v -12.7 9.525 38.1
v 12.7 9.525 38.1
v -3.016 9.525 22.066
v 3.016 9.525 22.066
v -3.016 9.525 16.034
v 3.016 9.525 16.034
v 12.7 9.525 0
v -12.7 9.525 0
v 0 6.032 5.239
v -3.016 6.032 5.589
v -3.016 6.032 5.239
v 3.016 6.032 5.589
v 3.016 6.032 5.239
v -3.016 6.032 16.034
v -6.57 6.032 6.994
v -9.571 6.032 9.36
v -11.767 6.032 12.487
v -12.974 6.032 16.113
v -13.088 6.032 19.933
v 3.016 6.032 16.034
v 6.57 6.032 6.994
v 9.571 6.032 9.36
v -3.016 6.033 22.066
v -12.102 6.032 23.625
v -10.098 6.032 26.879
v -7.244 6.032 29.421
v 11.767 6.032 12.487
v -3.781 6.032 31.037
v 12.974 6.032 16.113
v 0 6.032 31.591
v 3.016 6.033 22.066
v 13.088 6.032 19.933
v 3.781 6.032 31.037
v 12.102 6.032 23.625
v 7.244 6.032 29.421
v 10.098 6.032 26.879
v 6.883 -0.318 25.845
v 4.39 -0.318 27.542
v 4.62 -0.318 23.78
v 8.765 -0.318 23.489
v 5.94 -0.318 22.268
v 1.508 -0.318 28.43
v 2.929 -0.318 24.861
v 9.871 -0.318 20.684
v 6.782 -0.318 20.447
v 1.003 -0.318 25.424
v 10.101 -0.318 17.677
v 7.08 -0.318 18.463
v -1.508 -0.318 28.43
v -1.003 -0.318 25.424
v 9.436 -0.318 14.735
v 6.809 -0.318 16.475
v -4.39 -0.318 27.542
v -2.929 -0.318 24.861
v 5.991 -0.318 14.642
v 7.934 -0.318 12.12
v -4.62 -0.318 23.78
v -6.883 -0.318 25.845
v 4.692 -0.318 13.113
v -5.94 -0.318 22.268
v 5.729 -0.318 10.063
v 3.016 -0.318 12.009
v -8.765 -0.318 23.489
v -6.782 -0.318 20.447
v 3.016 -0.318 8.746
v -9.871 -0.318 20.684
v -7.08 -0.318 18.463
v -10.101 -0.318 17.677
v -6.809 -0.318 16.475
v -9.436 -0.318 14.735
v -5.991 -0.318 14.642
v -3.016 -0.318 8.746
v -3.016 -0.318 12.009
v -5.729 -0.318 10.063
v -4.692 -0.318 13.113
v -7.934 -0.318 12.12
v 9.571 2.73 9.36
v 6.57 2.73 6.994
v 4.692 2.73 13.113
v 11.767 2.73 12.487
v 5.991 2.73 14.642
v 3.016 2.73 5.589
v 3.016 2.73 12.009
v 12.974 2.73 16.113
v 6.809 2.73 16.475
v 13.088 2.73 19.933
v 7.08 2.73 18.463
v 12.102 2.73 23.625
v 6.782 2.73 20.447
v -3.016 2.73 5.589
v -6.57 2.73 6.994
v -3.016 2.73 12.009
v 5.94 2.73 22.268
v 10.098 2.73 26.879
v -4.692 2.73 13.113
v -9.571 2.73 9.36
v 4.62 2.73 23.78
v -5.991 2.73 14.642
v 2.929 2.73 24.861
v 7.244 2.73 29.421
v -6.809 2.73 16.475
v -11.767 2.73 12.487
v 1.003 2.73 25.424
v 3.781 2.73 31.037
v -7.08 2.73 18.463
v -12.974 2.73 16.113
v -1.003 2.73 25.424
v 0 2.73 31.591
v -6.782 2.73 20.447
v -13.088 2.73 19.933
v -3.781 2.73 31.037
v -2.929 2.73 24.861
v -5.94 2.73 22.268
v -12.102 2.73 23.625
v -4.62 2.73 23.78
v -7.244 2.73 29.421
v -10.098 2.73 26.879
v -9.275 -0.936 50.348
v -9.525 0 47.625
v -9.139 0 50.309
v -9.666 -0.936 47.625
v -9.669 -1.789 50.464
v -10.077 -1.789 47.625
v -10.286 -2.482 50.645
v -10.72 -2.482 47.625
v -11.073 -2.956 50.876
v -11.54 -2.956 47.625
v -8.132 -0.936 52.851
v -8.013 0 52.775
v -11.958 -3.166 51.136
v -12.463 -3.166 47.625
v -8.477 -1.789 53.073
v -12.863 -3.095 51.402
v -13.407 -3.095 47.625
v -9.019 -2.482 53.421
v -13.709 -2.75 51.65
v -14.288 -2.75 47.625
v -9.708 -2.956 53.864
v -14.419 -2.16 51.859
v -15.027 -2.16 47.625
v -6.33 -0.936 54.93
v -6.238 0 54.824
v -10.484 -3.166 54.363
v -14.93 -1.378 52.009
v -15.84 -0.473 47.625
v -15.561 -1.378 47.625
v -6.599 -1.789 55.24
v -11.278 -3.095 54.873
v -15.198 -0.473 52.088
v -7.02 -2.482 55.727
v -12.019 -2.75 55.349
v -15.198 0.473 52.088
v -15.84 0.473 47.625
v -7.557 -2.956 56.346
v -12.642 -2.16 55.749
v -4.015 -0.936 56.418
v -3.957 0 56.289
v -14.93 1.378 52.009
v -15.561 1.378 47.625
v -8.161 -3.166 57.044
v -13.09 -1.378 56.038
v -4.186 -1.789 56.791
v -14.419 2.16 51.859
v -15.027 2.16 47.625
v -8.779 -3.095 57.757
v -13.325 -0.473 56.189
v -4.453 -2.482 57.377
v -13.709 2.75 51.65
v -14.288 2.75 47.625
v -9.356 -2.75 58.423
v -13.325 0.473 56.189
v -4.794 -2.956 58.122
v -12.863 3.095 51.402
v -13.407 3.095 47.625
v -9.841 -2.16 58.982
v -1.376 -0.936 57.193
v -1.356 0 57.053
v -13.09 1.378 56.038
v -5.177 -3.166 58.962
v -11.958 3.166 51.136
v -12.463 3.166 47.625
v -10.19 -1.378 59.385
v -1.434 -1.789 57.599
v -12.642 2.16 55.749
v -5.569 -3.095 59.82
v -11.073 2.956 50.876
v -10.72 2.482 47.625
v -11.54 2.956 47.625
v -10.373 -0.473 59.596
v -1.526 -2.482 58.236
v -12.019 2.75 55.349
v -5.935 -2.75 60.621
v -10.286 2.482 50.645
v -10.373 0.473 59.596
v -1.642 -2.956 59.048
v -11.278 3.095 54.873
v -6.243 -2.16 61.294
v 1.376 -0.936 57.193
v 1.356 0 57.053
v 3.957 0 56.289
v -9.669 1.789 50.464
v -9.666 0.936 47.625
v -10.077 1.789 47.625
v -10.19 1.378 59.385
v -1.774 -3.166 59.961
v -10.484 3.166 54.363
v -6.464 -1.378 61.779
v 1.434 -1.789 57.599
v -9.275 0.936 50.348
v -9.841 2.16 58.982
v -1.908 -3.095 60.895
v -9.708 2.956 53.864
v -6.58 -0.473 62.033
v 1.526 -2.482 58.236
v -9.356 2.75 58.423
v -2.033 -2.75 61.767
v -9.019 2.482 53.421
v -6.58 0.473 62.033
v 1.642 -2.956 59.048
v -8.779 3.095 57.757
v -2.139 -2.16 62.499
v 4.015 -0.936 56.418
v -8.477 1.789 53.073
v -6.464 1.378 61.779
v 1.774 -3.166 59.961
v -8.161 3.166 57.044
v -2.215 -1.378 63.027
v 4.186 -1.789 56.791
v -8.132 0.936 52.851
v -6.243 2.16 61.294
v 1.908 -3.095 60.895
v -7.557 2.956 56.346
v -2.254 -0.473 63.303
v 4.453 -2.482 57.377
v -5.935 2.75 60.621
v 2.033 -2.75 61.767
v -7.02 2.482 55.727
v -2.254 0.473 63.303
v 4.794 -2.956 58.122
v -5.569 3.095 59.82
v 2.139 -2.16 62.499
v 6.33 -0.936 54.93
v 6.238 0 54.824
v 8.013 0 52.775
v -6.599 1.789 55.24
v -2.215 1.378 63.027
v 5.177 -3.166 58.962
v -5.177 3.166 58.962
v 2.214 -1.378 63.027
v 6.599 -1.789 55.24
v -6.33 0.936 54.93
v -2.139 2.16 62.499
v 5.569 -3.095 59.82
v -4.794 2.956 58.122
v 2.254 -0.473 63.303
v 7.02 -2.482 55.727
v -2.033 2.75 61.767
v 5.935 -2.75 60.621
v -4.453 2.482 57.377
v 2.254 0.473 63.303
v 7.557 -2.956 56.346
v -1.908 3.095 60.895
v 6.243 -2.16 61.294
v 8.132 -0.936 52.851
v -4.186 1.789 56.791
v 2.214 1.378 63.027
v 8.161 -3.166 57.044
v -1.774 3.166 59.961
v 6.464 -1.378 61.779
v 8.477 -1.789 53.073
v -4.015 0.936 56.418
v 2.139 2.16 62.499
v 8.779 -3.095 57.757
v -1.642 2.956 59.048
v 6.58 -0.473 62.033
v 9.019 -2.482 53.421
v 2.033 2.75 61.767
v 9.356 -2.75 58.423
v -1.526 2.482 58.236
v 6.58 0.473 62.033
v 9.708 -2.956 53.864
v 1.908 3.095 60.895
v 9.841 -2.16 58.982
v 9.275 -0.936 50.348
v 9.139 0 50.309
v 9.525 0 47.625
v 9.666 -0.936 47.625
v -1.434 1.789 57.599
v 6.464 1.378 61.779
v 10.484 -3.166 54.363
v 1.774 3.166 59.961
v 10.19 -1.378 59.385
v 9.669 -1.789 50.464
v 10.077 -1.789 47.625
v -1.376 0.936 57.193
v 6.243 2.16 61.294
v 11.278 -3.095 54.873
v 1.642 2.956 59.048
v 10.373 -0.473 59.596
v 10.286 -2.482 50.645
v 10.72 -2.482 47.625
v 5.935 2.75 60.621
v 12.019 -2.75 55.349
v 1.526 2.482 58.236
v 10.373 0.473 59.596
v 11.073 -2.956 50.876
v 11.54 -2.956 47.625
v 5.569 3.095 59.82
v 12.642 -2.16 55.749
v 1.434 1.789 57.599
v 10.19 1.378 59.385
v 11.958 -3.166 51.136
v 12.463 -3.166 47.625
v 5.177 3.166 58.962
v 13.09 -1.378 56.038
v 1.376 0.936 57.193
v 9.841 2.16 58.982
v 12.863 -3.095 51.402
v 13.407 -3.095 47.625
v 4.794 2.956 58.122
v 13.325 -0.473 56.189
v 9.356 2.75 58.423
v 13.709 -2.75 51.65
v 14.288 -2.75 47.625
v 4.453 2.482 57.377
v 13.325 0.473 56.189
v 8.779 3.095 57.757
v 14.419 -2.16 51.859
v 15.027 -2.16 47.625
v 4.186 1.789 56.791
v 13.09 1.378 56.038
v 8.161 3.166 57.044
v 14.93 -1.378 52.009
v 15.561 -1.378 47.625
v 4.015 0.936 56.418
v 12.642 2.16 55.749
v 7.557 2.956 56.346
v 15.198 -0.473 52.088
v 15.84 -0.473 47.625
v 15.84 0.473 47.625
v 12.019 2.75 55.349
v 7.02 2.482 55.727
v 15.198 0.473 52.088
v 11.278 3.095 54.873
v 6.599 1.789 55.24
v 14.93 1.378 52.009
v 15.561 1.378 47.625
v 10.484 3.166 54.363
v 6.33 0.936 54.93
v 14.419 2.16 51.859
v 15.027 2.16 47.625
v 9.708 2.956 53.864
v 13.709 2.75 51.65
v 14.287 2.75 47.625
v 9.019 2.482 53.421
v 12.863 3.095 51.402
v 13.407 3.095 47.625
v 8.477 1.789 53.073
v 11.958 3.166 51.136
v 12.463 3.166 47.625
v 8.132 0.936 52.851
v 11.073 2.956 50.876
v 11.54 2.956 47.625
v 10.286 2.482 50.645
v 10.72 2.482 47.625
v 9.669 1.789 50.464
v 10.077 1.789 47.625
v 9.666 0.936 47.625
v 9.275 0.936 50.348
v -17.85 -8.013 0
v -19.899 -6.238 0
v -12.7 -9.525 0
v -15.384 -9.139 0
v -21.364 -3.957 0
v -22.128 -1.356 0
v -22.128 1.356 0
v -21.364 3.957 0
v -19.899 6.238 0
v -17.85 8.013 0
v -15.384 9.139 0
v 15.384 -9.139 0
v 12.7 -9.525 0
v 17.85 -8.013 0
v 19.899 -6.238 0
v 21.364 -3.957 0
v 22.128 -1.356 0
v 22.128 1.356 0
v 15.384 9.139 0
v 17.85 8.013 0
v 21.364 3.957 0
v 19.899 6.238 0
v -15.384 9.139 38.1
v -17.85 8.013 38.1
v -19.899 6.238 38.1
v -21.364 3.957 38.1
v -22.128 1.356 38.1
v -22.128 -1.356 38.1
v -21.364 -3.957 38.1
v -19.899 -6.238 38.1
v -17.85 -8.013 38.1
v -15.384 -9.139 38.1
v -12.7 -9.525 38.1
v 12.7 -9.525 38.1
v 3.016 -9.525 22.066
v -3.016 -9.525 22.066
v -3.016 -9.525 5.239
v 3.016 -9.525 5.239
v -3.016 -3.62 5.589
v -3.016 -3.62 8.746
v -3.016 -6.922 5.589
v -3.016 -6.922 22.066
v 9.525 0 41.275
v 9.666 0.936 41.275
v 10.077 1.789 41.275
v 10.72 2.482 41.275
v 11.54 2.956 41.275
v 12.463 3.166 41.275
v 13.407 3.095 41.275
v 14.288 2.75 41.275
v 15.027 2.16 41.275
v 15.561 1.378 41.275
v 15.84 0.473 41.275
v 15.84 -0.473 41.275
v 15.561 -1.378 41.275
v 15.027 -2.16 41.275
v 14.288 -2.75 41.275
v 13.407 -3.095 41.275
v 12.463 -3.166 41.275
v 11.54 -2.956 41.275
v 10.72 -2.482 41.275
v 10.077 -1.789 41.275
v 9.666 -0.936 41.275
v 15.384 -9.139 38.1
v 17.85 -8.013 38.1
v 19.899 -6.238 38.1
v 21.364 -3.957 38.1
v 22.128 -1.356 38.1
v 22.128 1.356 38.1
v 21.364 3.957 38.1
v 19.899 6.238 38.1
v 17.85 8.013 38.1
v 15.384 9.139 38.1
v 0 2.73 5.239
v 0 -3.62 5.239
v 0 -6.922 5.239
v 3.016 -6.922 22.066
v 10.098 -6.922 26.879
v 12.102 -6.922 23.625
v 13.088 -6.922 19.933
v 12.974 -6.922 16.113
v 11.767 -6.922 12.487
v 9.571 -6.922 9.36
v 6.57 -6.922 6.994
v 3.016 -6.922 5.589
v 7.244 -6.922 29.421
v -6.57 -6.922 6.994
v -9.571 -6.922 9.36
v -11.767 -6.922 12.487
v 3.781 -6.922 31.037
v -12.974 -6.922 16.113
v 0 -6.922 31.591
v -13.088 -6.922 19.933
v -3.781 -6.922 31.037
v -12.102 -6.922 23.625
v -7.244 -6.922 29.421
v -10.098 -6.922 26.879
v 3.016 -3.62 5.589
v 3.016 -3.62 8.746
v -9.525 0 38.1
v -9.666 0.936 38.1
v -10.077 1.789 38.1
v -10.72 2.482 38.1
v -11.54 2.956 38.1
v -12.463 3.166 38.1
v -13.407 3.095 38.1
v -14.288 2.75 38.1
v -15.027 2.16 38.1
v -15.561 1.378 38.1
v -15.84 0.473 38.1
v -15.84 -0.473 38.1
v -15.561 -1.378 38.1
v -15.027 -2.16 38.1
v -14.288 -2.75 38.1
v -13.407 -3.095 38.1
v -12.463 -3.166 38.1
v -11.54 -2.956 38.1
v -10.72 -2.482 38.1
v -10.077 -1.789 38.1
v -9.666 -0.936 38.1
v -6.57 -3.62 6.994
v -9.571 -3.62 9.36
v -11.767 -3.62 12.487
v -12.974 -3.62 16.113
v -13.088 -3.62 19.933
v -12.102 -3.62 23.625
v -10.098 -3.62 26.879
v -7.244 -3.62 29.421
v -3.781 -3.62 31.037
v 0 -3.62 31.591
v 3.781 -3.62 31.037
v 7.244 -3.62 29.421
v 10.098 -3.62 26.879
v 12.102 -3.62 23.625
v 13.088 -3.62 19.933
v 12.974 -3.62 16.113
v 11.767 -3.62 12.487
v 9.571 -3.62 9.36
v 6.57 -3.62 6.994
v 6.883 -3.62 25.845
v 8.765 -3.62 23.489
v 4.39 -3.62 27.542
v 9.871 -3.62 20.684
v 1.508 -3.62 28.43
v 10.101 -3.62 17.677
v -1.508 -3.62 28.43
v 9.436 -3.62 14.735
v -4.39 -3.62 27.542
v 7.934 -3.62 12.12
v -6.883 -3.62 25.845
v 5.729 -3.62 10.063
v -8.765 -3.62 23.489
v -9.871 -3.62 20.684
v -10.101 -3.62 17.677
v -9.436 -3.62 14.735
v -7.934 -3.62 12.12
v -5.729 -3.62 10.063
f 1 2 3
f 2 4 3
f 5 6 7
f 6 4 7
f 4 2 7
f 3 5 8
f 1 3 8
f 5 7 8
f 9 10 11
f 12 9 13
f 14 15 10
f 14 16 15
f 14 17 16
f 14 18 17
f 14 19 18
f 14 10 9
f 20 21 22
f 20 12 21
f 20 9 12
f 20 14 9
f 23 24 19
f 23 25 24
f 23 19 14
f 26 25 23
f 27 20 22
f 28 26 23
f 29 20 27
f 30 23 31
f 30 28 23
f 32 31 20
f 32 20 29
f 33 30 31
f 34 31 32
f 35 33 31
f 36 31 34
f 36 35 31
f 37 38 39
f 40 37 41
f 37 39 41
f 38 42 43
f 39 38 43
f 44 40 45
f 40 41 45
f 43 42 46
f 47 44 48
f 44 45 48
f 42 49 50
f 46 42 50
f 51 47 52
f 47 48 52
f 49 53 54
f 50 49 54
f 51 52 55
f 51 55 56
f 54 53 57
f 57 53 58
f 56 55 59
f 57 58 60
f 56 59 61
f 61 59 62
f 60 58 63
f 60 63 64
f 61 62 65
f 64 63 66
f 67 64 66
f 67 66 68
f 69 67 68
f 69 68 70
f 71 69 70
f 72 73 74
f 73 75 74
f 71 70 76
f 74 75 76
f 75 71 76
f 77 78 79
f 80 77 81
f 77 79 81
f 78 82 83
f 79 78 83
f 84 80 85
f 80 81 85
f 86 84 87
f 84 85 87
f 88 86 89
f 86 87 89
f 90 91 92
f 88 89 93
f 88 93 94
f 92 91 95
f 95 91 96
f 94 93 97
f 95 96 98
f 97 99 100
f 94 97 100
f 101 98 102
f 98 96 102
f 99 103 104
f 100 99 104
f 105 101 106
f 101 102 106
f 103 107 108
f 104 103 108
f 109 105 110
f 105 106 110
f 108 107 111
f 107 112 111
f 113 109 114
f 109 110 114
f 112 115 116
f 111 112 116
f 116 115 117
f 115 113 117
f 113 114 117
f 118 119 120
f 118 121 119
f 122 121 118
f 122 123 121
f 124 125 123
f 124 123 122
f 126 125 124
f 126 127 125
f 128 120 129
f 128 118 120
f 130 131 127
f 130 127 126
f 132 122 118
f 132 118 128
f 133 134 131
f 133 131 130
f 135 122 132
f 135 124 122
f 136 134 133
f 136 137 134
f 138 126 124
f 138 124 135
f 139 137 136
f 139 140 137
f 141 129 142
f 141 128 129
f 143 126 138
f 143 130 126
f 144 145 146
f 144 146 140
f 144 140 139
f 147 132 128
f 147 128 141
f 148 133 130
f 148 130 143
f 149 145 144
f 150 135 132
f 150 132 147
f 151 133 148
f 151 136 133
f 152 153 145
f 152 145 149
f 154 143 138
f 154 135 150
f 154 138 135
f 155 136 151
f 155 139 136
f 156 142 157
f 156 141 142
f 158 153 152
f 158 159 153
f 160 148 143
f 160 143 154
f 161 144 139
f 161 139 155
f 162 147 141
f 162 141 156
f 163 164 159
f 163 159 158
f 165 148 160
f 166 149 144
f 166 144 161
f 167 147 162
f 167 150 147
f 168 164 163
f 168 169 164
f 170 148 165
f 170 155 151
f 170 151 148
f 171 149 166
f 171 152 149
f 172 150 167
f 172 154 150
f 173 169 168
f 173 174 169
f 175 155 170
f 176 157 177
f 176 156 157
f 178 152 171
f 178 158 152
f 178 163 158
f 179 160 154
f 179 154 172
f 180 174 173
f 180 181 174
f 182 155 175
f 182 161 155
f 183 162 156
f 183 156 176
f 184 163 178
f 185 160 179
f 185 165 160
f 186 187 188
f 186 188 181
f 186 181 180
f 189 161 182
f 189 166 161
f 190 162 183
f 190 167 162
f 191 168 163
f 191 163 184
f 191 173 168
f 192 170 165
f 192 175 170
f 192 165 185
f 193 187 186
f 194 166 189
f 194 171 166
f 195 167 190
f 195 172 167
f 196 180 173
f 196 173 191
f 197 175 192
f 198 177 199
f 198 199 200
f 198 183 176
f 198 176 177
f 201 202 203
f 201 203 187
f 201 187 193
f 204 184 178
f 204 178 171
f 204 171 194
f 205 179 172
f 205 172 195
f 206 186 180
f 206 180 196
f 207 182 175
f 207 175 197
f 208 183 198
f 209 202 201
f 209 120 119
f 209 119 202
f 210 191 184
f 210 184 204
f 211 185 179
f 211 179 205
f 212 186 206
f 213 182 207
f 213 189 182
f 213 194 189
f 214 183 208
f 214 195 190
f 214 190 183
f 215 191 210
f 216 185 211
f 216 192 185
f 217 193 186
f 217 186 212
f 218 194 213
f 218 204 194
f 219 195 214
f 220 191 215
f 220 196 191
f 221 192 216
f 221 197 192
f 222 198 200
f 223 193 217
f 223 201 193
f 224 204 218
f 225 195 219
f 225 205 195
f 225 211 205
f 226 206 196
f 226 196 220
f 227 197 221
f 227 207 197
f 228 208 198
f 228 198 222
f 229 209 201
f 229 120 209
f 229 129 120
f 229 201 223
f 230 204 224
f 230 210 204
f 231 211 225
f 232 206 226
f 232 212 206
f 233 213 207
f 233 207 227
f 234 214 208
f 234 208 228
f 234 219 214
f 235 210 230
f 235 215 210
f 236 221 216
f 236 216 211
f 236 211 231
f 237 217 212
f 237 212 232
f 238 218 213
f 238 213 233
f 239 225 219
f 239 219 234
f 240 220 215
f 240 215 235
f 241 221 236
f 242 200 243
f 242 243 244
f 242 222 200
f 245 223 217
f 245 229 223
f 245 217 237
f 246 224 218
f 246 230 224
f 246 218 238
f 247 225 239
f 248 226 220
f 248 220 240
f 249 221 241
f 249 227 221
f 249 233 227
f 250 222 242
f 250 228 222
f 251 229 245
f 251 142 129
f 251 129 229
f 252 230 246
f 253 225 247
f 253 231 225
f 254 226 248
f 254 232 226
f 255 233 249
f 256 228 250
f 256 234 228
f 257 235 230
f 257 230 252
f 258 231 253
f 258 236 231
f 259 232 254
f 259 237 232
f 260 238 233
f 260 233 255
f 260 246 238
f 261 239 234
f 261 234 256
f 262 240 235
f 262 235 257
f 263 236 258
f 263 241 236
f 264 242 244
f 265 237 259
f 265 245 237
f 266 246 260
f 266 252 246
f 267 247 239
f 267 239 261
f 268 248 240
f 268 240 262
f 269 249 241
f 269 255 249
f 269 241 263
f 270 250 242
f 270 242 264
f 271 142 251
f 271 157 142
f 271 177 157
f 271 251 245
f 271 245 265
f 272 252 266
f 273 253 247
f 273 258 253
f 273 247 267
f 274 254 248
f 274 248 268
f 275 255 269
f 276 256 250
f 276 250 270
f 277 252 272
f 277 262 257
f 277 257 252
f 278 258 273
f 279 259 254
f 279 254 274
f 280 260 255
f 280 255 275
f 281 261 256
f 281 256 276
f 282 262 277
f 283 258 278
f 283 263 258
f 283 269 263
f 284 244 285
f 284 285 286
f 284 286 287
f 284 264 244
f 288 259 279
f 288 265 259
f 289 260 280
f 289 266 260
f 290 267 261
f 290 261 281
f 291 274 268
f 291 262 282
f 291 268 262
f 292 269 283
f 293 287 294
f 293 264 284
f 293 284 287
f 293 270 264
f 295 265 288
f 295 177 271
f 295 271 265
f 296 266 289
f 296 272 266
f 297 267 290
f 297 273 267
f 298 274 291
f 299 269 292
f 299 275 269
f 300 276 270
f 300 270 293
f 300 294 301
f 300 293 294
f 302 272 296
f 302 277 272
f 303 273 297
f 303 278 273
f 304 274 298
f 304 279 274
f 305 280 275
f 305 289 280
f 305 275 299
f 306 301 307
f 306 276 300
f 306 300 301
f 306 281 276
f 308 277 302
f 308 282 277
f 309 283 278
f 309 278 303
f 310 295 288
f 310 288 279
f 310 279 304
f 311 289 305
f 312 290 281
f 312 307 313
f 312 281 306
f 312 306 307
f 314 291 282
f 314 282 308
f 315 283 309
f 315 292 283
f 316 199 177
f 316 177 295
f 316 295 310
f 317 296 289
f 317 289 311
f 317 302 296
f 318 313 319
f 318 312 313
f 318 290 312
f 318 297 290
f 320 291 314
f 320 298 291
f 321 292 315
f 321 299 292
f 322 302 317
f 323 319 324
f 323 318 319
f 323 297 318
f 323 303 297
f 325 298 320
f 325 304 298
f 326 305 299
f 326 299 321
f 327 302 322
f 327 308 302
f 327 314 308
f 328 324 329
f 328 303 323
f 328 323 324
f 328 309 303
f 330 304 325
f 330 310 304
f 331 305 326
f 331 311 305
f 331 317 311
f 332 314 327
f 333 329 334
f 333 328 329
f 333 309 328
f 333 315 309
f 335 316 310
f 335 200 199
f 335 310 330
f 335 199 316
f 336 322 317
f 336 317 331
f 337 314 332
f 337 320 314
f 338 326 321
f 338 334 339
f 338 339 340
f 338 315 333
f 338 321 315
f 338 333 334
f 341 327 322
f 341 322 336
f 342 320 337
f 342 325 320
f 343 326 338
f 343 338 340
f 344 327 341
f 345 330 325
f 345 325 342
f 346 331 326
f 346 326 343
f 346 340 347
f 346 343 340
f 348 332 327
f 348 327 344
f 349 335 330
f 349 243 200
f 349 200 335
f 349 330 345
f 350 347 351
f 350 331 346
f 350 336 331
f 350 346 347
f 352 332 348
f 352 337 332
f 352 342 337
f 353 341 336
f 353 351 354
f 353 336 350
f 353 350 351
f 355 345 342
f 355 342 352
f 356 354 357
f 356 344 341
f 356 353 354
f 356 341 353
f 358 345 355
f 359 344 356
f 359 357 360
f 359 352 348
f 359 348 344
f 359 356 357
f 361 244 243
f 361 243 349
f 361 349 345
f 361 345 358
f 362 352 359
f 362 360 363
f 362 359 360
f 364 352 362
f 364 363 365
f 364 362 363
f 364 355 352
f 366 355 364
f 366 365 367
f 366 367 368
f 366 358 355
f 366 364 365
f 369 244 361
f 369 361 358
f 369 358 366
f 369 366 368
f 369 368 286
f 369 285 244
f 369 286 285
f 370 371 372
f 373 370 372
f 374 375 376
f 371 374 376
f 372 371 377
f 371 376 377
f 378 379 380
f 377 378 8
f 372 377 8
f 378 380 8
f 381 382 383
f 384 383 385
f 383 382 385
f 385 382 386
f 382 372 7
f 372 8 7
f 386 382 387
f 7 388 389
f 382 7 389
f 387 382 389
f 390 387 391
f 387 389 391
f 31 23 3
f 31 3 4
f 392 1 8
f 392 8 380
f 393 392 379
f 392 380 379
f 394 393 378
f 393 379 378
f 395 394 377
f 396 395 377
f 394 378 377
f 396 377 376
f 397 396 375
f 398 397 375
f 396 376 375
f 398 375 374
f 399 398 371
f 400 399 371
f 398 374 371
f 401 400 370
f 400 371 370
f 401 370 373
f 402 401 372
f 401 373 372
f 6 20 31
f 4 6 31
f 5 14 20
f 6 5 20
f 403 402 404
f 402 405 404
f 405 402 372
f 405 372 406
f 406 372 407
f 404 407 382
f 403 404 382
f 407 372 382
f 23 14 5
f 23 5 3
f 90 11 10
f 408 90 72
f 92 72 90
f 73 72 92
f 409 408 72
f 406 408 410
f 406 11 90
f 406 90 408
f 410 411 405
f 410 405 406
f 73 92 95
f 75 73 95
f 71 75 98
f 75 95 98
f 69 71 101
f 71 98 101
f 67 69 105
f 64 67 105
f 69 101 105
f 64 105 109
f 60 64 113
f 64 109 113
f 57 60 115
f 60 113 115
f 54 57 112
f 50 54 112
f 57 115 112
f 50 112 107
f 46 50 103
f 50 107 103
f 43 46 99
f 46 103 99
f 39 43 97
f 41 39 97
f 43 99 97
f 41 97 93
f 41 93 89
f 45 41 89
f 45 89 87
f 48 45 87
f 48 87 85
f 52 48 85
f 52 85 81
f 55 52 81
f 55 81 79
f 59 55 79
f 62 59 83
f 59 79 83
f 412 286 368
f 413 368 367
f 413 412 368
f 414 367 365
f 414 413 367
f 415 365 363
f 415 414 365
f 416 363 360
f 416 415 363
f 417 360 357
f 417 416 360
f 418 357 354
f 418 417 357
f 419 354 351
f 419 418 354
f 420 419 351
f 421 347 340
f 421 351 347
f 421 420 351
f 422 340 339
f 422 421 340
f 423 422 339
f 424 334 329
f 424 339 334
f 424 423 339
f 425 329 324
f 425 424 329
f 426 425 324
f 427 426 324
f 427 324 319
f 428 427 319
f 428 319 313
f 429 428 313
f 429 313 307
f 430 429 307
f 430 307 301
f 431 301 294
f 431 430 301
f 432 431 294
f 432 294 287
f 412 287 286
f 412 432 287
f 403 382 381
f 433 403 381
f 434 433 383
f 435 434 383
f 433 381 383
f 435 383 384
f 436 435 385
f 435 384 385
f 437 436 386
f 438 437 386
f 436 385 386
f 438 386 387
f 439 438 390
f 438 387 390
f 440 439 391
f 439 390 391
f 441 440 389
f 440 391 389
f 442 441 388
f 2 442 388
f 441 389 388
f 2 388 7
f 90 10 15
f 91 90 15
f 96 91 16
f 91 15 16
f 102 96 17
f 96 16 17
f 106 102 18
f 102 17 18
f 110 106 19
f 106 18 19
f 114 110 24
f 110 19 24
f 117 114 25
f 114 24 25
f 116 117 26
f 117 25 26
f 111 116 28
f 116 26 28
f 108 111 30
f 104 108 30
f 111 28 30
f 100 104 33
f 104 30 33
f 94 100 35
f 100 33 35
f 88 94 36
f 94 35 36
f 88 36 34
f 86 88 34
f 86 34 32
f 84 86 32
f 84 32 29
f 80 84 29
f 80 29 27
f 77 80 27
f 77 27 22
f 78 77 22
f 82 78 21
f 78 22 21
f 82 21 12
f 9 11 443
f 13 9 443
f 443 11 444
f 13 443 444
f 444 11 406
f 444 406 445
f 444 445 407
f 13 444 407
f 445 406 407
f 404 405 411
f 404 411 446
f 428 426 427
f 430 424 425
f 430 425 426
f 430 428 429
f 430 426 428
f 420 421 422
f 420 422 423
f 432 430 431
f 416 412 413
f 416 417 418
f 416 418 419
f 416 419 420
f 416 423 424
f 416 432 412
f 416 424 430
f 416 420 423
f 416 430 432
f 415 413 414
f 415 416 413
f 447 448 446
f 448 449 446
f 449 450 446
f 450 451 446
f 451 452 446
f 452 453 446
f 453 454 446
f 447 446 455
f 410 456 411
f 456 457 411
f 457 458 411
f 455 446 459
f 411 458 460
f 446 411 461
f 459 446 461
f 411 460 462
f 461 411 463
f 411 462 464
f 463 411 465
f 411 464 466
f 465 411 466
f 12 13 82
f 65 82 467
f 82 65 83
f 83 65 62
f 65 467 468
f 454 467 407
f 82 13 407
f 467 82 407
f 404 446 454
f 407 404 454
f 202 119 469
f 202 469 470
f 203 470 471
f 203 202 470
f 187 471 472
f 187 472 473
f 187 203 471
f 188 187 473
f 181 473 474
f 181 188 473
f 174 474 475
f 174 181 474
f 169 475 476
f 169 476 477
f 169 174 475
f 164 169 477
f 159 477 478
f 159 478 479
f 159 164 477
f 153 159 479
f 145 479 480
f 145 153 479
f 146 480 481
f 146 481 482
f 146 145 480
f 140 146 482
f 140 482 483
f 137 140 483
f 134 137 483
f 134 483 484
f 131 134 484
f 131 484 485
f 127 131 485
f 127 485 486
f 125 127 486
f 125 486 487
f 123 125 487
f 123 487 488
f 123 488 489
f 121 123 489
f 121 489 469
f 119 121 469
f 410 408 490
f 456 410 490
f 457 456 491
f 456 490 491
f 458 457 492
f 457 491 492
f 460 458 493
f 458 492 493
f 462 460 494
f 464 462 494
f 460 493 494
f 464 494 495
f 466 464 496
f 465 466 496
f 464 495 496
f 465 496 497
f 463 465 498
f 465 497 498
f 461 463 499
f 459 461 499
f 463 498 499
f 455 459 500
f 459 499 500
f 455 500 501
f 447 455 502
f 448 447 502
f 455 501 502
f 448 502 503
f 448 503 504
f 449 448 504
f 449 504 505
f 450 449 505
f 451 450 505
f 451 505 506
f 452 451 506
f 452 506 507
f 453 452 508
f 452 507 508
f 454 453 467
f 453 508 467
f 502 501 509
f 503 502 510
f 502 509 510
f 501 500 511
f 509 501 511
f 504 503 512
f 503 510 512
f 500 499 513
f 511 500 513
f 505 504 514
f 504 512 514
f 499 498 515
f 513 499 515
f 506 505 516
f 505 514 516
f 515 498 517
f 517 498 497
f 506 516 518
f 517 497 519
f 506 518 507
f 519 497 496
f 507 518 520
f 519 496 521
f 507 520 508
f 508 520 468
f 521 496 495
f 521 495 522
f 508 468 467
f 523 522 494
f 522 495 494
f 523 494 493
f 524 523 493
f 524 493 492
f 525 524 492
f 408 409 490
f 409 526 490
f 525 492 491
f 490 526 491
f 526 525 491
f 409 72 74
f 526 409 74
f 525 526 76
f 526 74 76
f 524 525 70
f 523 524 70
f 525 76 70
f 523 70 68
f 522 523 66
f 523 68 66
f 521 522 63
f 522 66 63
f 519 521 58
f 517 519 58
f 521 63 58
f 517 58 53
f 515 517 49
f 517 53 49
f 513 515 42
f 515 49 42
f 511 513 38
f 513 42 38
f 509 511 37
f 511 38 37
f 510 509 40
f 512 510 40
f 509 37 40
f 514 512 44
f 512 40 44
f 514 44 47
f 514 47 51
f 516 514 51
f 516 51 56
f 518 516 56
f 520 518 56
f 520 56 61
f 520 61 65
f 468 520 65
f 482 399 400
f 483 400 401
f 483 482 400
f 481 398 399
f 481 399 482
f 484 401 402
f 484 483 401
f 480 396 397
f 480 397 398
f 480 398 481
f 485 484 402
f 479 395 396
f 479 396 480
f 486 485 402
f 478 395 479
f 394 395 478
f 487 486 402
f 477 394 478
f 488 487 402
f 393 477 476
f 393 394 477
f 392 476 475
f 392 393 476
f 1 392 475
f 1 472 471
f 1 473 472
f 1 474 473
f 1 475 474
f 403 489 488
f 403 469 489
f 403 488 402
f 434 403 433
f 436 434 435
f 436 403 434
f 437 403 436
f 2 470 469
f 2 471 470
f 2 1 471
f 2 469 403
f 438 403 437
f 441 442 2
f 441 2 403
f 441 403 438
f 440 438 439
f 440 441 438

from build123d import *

# Parameters (mm, degrees)
F1_DEPTH = 38.1
F2_W     = 6.0325
F2_H     = 6.0325
F3_DEPTH = 19.051
F4_W     = 6.0325
F4_H     = 10.795
F5_DEPTH = 15.5575
F8_R     = 3.175


with BuildPart() as f1:
    # F0 (on Top) → F1 (new body)
    with BuildSketch(Plane.XY):
        with BuildLine():
            ThreePointArc((12.7000021839, -9.525), (22.225, 1.0919e-06), (12.7, 9.525))
            Line((12.7, 9.525), (-12.7000021839, 9.525))
            ThreePointArc((-12.7000021839, 9.525), (-22.2250021839, -1.0919e-06), (-12.7, -9.525))
            Line((-12.7, -9.525), (12.7000021839, -9.525))
        make_face()
    extrude(amount=F1_DEPTH)

    # F2 (on face) → F3 (cut, through all)
    with BuildSketch(Plane.XZ.offset(9.525)):
        with Locations((0, 19.05)):
            Rectangle(F2_W, F2_H)
    extrude(amount=-F3_DEPTH, mode=Mode.SUBTRACT)

    # F4 (on face) → F5 (cut)
    with BuildSketch(Plane.XZ.offset(9.525)):
        with Locations((0, 10.63625)):
            Rectangle(F4_W, F4_H)
    extrude(amount=-F5_DEPTH, mode=Mode.SUBTRACT)

    # F6 (on Right) → F7 (revolve, cut)
    with BuildSketch(Plane.YZ):
        Polygon((6.0325, 5.23875), (6.0325, 18.415), (-6.9215, 18.415), (-6.9215, 5.23875), (-3.6195, 5.23875), (-3.6195, 8.28675), (-0.3175, 8.28675), (-0.3175, 11.33475), (2.7305, 11.33475), (2.7305, 5.23875), align=None)
    revolve(axis=Axis((0, -0.4445, 18.415), (0, 1, 0)), mode=Mode.SUBTRACT)

    # F10: sweep along a path in F9
    with BuildLine(Plane.XZ) as f10_path:
        Line((-12.7000021839, 38.1), (-12.7000021839, 47.625))
        ThreePointArc((-12.7000021839, 47.625), (-1.0919e-06, 60.3250010919), (12.7, 47.625))
        Line((12.7, 47.625), (12.7, 41.275))
    # F8 (on face) → F10 (sweep)
    with BuildSketch(Plane.XY.offset(38.1)):
        with Locations((-12.7000021839, 0)):
            Circle(F8_R)
    sweep(path=f10_path.line)


solid = f1.part
